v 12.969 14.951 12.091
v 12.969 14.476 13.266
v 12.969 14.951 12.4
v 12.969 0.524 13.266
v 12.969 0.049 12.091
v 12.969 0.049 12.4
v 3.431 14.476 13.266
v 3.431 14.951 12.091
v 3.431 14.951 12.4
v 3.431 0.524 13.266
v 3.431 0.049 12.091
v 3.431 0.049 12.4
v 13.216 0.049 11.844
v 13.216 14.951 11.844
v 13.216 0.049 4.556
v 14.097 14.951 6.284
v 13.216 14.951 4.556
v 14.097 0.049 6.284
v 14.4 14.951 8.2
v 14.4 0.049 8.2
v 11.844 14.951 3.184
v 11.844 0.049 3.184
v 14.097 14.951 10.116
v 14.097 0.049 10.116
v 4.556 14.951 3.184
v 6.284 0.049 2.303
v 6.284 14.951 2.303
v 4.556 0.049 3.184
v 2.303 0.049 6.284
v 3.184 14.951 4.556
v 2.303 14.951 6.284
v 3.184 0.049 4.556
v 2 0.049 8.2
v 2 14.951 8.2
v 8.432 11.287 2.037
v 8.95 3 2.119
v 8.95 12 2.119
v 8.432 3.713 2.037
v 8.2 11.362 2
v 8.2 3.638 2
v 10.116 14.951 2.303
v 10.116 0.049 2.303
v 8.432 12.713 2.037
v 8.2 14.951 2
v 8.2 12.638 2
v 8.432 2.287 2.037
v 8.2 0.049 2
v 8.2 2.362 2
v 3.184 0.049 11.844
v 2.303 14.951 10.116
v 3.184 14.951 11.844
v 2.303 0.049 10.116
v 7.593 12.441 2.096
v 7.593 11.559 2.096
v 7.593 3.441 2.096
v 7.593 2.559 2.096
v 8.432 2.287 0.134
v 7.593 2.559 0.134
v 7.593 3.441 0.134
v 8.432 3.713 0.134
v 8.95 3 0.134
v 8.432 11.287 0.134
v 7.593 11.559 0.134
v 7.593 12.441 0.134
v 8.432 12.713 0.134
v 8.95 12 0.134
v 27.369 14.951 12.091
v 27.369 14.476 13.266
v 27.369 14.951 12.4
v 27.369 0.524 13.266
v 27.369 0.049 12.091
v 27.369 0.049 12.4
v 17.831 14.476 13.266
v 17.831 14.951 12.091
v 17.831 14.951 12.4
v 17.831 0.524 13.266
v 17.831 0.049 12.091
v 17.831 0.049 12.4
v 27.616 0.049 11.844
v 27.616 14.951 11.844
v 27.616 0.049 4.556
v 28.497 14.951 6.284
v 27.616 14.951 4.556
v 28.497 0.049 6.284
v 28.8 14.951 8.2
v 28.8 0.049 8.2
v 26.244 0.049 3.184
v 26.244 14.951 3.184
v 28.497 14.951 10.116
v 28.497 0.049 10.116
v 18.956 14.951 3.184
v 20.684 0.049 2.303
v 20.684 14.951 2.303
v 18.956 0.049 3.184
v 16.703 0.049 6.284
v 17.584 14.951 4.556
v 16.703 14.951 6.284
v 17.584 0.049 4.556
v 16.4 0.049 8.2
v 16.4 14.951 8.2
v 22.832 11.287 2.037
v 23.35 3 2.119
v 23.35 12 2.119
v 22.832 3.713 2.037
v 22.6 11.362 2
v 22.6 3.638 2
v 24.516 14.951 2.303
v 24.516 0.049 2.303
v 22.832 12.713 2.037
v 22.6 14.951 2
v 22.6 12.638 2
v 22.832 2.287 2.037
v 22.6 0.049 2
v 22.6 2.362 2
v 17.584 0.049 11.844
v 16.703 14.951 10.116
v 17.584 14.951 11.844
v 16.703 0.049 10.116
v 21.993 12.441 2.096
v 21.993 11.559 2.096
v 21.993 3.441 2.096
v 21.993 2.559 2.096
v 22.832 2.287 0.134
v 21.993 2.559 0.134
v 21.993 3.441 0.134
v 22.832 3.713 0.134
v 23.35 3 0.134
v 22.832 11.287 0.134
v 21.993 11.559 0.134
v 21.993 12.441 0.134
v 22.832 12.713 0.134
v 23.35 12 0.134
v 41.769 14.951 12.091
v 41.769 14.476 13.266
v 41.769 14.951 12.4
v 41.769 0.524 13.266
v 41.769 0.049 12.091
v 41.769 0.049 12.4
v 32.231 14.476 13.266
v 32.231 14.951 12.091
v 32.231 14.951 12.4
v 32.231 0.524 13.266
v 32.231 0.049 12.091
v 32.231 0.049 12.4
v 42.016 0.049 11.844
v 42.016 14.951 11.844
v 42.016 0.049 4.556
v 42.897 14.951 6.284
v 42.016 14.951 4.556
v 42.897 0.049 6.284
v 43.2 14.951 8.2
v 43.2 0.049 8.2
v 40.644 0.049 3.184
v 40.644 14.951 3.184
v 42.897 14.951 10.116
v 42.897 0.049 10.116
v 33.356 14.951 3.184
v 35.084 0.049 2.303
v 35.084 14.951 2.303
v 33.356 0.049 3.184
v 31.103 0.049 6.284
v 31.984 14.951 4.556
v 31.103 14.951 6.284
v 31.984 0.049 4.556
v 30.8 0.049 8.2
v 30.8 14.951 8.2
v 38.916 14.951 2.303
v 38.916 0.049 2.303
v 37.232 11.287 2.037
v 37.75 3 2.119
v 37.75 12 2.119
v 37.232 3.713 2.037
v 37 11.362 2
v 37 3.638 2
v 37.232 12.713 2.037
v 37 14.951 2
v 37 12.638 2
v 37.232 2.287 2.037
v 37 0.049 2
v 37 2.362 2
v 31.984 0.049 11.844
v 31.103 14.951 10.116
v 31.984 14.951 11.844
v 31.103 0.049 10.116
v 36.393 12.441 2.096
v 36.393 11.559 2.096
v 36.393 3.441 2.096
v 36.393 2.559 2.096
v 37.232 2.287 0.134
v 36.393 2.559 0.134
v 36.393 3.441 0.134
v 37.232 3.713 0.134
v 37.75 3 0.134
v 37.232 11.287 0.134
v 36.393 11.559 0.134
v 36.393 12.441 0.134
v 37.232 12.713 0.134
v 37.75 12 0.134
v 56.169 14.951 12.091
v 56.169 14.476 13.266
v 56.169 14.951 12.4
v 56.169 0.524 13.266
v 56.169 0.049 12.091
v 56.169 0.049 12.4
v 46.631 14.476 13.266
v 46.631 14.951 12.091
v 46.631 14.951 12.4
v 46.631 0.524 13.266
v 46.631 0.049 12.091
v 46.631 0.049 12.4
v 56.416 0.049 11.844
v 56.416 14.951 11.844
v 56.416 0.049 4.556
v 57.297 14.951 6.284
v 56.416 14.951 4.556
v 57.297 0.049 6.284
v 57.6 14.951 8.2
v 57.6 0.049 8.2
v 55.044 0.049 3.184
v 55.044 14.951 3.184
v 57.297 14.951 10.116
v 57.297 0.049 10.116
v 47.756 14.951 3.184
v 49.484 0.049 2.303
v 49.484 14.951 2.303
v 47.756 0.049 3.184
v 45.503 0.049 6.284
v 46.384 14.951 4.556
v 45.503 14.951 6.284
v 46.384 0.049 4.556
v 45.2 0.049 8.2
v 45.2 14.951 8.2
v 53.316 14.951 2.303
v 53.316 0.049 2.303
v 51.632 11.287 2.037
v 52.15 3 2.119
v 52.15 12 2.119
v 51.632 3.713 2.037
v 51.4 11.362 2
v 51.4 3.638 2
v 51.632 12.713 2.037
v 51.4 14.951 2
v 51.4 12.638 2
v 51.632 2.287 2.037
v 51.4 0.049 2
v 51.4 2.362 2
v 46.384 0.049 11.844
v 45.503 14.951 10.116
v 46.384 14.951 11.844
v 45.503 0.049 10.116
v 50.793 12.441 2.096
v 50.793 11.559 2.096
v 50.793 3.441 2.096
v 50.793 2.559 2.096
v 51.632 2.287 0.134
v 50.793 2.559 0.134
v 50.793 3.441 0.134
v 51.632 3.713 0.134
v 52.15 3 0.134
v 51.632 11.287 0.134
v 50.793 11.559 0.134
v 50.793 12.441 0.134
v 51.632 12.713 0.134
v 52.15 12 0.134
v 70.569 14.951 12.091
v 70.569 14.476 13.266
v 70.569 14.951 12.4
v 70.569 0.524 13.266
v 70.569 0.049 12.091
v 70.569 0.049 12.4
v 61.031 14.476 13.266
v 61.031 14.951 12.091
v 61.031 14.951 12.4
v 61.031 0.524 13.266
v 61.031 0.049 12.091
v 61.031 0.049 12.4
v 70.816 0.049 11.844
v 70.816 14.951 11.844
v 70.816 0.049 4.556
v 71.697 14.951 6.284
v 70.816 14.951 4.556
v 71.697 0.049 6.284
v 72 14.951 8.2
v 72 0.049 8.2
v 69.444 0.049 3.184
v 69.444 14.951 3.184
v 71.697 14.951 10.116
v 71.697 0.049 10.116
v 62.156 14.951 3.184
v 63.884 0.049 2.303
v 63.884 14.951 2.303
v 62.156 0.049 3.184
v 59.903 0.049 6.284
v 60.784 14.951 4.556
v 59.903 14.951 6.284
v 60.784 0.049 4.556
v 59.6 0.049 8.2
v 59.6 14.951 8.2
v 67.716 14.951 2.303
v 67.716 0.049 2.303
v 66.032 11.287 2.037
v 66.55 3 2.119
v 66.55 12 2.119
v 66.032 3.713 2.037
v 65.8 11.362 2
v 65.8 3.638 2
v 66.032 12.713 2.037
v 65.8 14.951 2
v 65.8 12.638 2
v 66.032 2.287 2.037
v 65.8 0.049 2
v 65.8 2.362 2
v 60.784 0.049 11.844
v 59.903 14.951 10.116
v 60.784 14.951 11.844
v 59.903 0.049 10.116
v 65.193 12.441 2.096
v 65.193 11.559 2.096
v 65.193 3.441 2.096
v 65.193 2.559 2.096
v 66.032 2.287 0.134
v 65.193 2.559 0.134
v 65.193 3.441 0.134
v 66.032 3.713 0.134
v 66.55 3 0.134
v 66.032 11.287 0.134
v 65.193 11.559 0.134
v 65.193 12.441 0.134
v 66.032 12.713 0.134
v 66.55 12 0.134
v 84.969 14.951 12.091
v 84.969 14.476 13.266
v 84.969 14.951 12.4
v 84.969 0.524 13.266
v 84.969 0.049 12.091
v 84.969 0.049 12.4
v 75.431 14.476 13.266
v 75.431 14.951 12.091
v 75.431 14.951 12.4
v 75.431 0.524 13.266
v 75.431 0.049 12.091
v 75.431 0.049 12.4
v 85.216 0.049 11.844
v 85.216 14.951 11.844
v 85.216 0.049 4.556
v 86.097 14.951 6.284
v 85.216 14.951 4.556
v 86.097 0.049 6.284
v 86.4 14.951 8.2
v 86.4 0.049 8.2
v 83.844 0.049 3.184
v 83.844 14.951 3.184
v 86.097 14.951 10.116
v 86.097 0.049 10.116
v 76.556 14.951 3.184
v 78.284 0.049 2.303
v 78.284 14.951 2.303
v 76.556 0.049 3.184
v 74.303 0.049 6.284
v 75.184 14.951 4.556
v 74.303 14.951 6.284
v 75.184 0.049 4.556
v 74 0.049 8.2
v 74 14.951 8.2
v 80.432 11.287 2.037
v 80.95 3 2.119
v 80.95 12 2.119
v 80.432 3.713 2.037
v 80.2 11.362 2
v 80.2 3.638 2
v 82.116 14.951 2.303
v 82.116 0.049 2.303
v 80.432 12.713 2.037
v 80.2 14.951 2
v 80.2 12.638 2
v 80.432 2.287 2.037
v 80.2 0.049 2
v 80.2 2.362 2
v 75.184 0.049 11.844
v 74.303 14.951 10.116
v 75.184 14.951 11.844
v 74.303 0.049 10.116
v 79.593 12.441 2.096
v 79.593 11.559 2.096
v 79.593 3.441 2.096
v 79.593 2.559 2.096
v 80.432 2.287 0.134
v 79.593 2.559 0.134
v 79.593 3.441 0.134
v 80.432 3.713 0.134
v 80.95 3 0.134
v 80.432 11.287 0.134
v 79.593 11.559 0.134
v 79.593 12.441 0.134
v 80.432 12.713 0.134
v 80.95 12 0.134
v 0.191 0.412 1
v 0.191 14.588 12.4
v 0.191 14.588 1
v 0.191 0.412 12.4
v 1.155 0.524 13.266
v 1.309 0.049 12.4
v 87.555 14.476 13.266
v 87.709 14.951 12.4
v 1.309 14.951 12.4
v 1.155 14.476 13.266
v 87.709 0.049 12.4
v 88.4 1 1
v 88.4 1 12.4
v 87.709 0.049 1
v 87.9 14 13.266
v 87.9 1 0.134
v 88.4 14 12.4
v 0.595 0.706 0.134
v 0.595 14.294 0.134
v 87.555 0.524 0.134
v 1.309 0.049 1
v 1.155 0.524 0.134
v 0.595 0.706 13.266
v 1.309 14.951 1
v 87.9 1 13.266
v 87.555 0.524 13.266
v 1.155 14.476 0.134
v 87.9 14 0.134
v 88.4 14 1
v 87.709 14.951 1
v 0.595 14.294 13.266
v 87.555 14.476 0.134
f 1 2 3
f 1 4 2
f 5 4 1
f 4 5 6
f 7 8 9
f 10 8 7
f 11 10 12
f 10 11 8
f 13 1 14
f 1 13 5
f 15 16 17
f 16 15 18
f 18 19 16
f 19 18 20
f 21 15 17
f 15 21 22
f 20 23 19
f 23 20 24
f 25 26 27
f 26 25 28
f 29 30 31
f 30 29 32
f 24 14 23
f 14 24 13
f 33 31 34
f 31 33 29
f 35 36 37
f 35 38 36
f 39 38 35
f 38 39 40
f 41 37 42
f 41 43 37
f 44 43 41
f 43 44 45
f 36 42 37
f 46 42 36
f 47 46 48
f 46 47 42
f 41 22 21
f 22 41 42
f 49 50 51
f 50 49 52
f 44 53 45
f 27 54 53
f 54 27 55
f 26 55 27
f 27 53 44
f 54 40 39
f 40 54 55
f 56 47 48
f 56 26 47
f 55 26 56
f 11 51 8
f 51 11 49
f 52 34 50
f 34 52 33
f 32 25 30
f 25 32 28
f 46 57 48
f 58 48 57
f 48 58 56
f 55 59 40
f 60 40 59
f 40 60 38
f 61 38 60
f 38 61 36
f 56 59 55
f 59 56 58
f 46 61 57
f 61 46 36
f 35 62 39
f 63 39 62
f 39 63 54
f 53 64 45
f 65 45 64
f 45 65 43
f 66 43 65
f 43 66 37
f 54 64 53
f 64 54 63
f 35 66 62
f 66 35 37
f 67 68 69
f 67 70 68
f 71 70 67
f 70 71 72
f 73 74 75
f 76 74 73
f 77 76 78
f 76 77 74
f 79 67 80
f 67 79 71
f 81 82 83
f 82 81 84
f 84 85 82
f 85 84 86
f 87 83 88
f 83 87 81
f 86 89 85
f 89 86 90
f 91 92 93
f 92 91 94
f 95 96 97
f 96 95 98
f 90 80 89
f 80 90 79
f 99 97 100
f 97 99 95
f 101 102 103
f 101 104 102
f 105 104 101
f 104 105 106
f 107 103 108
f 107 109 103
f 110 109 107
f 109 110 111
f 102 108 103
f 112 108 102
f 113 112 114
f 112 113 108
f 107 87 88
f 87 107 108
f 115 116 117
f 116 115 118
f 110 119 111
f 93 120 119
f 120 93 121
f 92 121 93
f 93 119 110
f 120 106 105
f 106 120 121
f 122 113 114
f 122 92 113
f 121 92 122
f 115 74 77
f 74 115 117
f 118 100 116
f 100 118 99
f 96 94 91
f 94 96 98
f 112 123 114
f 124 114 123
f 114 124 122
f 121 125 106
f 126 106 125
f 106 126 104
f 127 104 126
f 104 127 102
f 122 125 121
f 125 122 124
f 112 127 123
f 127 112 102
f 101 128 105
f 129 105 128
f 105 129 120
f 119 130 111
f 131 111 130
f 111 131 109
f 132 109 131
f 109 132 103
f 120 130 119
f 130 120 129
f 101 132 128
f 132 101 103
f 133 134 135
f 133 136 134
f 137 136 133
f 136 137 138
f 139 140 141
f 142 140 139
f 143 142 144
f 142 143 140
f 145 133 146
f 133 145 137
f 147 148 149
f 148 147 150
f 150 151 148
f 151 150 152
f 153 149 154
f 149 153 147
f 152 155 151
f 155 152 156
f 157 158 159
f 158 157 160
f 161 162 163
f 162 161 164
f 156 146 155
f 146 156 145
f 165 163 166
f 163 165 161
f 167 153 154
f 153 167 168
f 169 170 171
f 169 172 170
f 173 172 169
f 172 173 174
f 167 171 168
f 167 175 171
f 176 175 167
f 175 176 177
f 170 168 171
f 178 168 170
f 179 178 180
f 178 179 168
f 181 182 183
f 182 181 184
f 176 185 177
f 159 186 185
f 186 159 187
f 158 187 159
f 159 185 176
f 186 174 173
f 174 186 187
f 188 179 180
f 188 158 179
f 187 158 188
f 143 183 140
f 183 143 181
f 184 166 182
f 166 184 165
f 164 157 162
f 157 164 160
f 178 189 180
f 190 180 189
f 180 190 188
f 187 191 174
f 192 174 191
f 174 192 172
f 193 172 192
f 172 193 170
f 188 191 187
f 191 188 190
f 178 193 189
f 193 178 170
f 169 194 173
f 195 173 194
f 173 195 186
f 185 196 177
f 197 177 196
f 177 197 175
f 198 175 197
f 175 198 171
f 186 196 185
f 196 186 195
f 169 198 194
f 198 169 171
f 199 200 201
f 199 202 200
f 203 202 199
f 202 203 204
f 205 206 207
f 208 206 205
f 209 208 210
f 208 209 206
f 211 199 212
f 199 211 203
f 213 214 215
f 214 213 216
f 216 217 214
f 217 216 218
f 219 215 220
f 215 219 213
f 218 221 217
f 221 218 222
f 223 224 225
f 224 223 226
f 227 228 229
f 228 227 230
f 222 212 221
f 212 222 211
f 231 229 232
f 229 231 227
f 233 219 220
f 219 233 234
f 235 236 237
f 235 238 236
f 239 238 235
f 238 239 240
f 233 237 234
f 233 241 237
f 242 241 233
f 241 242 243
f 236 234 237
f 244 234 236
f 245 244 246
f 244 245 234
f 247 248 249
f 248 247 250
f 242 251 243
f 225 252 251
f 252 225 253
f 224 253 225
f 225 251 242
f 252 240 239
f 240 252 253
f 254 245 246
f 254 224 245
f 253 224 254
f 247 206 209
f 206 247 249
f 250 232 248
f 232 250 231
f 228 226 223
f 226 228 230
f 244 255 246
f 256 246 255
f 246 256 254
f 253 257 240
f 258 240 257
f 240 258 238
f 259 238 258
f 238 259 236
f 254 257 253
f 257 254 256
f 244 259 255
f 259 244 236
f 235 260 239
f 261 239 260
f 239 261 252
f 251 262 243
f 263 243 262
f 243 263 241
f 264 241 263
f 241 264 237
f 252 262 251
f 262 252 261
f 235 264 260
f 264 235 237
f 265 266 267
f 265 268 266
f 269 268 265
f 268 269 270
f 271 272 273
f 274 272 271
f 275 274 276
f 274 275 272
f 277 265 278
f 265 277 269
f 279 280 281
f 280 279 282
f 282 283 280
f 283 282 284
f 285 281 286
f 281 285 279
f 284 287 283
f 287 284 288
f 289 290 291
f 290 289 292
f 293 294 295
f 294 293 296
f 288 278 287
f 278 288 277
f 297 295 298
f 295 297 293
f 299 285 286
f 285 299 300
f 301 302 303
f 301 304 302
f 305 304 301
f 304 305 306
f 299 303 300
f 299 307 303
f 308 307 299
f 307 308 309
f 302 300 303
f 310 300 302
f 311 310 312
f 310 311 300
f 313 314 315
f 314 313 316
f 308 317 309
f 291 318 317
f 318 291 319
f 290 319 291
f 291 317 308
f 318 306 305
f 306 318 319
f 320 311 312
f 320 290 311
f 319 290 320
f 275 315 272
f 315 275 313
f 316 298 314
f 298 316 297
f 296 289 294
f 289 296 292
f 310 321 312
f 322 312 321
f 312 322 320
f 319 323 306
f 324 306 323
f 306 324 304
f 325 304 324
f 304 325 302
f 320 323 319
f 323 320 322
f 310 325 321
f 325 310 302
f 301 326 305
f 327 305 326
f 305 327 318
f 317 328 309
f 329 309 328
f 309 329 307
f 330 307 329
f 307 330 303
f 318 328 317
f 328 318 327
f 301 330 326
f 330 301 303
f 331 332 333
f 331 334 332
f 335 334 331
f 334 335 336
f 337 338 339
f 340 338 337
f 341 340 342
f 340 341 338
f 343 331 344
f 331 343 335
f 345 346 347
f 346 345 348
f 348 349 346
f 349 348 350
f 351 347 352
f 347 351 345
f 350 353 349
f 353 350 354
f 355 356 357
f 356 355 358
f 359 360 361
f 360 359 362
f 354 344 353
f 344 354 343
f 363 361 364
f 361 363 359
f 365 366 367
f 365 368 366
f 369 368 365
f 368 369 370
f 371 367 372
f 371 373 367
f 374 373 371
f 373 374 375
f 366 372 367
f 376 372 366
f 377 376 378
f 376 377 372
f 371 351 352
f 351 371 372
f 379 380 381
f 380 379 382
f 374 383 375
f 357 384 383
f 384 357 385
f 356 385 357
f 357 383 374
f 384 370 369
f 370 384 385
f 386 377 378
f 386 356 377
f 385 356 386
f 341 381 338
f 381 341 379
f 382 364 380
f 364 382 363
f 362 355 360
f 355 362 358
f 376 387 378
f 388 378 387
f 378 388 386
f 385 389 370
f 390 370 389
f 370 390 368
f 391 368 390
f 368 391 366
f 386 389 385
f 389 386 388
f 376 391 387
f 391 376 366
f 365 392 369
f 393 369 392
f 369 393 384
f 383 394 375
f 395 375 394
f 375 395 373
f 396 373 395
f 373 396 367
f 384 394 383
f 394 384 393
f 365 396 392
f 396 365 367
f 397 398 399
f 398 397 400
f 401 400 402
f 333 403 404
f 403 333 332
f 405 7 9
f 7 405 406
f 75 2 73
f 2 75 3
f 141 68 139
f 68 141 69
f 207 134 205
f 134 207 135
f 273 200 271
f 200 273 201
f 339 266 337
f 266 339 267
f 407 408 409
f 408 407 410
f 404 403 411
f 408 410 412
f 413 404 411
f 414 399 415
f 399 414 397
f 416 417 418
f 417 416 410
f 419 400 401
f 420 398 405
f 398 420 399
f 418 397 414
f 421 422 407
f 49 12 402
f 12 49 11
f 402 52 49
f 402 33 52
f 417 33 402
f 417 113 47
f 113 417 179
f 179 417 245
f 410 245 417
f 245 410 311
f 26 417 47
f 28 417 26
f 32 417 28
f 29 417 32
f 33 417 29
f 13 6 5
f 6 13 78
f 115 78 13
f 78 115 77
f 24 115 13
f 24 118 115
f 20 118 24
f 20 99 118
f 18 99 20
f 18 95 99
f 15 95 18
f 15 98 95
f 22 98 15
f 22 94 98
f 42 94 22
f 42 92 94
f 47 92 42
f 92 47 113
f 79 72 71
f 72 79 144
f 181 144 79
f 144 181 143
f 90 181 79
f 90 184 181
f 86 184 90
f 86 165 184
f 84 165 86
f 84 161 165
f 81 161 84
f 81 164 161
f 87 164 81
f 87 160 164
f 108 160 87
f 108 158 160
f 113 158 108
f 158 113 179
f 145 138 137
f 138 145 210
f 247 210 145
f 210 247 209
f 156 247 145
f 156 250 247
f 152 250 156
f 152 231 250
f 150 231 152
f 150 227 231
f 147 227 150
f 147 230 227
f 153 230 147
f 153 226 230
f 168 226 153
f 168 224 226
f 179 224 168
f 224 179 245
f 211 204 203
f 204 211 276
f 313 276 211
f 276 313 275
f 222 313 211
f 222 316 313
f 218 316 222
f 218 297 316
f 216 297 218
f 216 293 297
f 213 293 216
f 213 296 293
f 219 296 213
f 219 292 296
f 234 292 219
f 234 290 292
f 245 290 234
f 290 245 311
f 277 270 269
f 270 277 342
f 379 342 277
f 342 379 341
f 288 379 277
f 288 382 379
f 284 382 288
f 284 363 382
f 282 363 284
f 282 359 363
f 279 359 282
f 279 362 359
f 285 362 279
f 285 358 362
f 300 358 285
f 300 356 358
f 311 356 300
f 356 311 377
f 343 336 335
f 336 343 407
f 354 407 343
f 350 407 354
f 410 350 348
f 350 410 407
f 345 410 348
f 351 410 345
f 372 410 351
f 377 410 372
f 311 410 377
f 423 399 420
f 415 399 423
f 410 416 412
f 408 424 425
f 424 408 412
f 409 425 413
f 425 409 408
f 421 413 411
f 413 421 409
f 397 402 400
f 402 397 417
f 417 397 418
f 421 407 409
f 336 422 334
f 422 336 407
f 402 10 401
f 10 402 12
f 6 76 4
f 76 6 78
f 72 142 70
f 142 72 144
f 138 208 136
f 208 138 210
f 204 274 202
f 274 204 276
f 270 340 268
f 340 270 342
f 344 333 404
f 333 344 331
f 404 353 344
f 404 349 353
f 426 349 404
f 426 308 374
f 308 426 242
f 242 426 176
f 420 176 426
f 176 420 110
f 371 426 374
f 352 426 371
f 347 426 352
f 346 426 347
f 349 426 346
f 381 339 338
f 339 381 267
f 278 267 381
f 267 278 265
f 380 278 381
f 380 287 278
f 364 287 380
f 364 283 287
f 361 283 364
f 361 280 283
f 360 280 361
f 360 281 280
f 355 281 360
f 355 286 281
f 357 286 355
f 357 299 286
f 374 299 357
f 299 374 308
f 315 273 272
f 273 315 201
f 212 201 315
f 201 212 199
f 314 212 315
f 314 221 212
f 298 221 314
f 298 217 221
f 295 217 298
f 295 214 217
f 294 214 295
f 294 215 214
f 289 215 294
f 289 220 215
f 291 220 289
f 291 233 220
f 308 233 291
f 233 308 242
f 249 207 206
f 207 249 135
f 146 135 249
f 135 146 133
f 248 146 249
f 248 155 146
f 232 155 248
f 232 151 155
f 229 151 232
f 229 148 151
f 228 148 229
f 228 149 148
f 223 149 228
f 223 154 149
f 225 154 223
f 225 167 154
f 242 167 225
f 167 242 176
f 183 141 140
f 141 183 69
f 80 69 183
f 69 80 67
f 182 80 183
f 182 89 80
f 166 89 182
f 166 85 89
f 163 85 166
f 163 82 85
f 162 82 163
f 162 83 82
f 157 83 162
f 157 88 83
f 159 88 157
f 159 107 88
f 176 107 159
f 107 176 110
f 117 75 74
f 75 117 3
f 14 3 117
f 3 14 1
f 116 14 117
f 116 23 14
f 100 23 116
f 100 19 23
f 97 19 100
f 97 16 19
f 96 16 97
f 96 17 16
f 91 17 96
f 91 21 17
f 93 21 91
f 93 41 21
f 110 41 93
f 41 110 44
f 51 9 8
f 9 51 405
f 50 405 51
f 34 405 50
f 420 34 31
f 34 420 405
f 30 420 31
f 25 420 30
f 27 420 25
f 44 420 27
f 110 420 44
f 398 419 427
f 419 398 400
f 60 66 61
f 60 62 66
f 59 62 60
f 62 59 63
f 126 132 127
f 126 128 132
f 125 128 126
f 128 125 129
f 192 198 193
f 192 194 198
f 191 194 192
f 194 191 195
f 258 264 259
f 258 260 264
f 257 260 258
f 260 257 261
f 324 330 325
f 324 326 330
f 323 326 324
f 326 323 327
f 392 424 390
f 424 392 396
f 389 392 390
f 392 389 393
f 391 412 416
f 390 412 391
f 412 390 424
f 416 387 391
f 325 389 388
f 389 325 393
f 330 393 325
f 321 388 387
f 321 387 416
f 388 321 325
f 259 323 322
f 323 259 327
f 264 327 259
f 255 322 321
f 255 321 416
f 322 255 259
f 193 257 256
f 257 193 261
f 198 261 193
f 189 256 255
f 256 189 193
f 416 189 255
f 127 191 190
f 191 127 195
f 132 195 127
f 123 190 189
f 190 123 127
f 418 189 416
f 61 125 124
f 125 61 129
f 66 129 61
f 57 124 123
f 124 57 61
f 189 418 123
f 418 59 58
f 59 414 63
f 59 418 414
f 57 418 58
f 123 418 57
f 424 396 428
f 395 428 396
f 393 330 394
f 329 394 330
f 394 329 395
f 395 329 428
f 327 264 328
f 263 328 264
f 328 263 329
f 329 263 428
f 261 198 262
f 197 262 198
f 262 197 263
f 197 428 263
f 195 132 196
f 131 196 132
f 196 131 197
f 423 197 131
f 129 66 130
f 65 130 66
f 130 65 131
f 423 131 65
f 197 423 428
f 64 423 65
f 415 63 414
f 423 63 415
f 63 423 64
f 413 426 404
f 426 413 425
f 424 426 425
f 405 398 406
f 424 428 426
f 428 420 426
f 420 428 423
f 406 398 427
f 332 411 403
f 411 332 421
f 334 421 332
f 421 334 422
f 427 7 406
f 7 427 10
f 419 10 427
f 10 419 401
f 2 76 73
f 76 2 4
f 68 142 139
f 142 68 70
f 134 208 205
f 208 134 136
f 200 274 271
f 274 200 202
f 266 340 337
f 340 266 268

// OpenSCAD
// foam dart holder suitable to be sewn onto a bandolier strap

count = 6;
diameter = 12.4;
space = 2;
radius = 1;
thickness = 15;
hole_ratio = 1.3;

difference() {
    translate([radius,radius,radius]) {
        minkowski() {
            cube([
                (diameter + space) * count + space - radius * 2, 
                thickness - radius * 2, 
                space/2 + diameter - radius * 2
            ]);
            sphere(radius);
        }
    }
    for (x = [0:1:count - 1]) {
        translate([(x+0.5) * (diameter + space) + space/2, 0, diameter/2 + space]) {
            translate([-diameter/(hole_ratio*2), 0, 0]) {
                cube([diameter/hole_ratio, thickness + 1, diameter/hole_ratio + radius]);
            }
            rotate([270,0,0]) {
                cylinder(r=diameter/2, h=thickness + 1);
            }
            
            translate([0,thickness / 5,-(diameter/2+space)]) {
                cylinder(r=0.75, h=space + 1);
            }
            translate([0,thickness - thickness / 5,-(diameter/2+space)]) {
                cylinder(r=0.75, h=space + 1);
            }
        }
    }
}
